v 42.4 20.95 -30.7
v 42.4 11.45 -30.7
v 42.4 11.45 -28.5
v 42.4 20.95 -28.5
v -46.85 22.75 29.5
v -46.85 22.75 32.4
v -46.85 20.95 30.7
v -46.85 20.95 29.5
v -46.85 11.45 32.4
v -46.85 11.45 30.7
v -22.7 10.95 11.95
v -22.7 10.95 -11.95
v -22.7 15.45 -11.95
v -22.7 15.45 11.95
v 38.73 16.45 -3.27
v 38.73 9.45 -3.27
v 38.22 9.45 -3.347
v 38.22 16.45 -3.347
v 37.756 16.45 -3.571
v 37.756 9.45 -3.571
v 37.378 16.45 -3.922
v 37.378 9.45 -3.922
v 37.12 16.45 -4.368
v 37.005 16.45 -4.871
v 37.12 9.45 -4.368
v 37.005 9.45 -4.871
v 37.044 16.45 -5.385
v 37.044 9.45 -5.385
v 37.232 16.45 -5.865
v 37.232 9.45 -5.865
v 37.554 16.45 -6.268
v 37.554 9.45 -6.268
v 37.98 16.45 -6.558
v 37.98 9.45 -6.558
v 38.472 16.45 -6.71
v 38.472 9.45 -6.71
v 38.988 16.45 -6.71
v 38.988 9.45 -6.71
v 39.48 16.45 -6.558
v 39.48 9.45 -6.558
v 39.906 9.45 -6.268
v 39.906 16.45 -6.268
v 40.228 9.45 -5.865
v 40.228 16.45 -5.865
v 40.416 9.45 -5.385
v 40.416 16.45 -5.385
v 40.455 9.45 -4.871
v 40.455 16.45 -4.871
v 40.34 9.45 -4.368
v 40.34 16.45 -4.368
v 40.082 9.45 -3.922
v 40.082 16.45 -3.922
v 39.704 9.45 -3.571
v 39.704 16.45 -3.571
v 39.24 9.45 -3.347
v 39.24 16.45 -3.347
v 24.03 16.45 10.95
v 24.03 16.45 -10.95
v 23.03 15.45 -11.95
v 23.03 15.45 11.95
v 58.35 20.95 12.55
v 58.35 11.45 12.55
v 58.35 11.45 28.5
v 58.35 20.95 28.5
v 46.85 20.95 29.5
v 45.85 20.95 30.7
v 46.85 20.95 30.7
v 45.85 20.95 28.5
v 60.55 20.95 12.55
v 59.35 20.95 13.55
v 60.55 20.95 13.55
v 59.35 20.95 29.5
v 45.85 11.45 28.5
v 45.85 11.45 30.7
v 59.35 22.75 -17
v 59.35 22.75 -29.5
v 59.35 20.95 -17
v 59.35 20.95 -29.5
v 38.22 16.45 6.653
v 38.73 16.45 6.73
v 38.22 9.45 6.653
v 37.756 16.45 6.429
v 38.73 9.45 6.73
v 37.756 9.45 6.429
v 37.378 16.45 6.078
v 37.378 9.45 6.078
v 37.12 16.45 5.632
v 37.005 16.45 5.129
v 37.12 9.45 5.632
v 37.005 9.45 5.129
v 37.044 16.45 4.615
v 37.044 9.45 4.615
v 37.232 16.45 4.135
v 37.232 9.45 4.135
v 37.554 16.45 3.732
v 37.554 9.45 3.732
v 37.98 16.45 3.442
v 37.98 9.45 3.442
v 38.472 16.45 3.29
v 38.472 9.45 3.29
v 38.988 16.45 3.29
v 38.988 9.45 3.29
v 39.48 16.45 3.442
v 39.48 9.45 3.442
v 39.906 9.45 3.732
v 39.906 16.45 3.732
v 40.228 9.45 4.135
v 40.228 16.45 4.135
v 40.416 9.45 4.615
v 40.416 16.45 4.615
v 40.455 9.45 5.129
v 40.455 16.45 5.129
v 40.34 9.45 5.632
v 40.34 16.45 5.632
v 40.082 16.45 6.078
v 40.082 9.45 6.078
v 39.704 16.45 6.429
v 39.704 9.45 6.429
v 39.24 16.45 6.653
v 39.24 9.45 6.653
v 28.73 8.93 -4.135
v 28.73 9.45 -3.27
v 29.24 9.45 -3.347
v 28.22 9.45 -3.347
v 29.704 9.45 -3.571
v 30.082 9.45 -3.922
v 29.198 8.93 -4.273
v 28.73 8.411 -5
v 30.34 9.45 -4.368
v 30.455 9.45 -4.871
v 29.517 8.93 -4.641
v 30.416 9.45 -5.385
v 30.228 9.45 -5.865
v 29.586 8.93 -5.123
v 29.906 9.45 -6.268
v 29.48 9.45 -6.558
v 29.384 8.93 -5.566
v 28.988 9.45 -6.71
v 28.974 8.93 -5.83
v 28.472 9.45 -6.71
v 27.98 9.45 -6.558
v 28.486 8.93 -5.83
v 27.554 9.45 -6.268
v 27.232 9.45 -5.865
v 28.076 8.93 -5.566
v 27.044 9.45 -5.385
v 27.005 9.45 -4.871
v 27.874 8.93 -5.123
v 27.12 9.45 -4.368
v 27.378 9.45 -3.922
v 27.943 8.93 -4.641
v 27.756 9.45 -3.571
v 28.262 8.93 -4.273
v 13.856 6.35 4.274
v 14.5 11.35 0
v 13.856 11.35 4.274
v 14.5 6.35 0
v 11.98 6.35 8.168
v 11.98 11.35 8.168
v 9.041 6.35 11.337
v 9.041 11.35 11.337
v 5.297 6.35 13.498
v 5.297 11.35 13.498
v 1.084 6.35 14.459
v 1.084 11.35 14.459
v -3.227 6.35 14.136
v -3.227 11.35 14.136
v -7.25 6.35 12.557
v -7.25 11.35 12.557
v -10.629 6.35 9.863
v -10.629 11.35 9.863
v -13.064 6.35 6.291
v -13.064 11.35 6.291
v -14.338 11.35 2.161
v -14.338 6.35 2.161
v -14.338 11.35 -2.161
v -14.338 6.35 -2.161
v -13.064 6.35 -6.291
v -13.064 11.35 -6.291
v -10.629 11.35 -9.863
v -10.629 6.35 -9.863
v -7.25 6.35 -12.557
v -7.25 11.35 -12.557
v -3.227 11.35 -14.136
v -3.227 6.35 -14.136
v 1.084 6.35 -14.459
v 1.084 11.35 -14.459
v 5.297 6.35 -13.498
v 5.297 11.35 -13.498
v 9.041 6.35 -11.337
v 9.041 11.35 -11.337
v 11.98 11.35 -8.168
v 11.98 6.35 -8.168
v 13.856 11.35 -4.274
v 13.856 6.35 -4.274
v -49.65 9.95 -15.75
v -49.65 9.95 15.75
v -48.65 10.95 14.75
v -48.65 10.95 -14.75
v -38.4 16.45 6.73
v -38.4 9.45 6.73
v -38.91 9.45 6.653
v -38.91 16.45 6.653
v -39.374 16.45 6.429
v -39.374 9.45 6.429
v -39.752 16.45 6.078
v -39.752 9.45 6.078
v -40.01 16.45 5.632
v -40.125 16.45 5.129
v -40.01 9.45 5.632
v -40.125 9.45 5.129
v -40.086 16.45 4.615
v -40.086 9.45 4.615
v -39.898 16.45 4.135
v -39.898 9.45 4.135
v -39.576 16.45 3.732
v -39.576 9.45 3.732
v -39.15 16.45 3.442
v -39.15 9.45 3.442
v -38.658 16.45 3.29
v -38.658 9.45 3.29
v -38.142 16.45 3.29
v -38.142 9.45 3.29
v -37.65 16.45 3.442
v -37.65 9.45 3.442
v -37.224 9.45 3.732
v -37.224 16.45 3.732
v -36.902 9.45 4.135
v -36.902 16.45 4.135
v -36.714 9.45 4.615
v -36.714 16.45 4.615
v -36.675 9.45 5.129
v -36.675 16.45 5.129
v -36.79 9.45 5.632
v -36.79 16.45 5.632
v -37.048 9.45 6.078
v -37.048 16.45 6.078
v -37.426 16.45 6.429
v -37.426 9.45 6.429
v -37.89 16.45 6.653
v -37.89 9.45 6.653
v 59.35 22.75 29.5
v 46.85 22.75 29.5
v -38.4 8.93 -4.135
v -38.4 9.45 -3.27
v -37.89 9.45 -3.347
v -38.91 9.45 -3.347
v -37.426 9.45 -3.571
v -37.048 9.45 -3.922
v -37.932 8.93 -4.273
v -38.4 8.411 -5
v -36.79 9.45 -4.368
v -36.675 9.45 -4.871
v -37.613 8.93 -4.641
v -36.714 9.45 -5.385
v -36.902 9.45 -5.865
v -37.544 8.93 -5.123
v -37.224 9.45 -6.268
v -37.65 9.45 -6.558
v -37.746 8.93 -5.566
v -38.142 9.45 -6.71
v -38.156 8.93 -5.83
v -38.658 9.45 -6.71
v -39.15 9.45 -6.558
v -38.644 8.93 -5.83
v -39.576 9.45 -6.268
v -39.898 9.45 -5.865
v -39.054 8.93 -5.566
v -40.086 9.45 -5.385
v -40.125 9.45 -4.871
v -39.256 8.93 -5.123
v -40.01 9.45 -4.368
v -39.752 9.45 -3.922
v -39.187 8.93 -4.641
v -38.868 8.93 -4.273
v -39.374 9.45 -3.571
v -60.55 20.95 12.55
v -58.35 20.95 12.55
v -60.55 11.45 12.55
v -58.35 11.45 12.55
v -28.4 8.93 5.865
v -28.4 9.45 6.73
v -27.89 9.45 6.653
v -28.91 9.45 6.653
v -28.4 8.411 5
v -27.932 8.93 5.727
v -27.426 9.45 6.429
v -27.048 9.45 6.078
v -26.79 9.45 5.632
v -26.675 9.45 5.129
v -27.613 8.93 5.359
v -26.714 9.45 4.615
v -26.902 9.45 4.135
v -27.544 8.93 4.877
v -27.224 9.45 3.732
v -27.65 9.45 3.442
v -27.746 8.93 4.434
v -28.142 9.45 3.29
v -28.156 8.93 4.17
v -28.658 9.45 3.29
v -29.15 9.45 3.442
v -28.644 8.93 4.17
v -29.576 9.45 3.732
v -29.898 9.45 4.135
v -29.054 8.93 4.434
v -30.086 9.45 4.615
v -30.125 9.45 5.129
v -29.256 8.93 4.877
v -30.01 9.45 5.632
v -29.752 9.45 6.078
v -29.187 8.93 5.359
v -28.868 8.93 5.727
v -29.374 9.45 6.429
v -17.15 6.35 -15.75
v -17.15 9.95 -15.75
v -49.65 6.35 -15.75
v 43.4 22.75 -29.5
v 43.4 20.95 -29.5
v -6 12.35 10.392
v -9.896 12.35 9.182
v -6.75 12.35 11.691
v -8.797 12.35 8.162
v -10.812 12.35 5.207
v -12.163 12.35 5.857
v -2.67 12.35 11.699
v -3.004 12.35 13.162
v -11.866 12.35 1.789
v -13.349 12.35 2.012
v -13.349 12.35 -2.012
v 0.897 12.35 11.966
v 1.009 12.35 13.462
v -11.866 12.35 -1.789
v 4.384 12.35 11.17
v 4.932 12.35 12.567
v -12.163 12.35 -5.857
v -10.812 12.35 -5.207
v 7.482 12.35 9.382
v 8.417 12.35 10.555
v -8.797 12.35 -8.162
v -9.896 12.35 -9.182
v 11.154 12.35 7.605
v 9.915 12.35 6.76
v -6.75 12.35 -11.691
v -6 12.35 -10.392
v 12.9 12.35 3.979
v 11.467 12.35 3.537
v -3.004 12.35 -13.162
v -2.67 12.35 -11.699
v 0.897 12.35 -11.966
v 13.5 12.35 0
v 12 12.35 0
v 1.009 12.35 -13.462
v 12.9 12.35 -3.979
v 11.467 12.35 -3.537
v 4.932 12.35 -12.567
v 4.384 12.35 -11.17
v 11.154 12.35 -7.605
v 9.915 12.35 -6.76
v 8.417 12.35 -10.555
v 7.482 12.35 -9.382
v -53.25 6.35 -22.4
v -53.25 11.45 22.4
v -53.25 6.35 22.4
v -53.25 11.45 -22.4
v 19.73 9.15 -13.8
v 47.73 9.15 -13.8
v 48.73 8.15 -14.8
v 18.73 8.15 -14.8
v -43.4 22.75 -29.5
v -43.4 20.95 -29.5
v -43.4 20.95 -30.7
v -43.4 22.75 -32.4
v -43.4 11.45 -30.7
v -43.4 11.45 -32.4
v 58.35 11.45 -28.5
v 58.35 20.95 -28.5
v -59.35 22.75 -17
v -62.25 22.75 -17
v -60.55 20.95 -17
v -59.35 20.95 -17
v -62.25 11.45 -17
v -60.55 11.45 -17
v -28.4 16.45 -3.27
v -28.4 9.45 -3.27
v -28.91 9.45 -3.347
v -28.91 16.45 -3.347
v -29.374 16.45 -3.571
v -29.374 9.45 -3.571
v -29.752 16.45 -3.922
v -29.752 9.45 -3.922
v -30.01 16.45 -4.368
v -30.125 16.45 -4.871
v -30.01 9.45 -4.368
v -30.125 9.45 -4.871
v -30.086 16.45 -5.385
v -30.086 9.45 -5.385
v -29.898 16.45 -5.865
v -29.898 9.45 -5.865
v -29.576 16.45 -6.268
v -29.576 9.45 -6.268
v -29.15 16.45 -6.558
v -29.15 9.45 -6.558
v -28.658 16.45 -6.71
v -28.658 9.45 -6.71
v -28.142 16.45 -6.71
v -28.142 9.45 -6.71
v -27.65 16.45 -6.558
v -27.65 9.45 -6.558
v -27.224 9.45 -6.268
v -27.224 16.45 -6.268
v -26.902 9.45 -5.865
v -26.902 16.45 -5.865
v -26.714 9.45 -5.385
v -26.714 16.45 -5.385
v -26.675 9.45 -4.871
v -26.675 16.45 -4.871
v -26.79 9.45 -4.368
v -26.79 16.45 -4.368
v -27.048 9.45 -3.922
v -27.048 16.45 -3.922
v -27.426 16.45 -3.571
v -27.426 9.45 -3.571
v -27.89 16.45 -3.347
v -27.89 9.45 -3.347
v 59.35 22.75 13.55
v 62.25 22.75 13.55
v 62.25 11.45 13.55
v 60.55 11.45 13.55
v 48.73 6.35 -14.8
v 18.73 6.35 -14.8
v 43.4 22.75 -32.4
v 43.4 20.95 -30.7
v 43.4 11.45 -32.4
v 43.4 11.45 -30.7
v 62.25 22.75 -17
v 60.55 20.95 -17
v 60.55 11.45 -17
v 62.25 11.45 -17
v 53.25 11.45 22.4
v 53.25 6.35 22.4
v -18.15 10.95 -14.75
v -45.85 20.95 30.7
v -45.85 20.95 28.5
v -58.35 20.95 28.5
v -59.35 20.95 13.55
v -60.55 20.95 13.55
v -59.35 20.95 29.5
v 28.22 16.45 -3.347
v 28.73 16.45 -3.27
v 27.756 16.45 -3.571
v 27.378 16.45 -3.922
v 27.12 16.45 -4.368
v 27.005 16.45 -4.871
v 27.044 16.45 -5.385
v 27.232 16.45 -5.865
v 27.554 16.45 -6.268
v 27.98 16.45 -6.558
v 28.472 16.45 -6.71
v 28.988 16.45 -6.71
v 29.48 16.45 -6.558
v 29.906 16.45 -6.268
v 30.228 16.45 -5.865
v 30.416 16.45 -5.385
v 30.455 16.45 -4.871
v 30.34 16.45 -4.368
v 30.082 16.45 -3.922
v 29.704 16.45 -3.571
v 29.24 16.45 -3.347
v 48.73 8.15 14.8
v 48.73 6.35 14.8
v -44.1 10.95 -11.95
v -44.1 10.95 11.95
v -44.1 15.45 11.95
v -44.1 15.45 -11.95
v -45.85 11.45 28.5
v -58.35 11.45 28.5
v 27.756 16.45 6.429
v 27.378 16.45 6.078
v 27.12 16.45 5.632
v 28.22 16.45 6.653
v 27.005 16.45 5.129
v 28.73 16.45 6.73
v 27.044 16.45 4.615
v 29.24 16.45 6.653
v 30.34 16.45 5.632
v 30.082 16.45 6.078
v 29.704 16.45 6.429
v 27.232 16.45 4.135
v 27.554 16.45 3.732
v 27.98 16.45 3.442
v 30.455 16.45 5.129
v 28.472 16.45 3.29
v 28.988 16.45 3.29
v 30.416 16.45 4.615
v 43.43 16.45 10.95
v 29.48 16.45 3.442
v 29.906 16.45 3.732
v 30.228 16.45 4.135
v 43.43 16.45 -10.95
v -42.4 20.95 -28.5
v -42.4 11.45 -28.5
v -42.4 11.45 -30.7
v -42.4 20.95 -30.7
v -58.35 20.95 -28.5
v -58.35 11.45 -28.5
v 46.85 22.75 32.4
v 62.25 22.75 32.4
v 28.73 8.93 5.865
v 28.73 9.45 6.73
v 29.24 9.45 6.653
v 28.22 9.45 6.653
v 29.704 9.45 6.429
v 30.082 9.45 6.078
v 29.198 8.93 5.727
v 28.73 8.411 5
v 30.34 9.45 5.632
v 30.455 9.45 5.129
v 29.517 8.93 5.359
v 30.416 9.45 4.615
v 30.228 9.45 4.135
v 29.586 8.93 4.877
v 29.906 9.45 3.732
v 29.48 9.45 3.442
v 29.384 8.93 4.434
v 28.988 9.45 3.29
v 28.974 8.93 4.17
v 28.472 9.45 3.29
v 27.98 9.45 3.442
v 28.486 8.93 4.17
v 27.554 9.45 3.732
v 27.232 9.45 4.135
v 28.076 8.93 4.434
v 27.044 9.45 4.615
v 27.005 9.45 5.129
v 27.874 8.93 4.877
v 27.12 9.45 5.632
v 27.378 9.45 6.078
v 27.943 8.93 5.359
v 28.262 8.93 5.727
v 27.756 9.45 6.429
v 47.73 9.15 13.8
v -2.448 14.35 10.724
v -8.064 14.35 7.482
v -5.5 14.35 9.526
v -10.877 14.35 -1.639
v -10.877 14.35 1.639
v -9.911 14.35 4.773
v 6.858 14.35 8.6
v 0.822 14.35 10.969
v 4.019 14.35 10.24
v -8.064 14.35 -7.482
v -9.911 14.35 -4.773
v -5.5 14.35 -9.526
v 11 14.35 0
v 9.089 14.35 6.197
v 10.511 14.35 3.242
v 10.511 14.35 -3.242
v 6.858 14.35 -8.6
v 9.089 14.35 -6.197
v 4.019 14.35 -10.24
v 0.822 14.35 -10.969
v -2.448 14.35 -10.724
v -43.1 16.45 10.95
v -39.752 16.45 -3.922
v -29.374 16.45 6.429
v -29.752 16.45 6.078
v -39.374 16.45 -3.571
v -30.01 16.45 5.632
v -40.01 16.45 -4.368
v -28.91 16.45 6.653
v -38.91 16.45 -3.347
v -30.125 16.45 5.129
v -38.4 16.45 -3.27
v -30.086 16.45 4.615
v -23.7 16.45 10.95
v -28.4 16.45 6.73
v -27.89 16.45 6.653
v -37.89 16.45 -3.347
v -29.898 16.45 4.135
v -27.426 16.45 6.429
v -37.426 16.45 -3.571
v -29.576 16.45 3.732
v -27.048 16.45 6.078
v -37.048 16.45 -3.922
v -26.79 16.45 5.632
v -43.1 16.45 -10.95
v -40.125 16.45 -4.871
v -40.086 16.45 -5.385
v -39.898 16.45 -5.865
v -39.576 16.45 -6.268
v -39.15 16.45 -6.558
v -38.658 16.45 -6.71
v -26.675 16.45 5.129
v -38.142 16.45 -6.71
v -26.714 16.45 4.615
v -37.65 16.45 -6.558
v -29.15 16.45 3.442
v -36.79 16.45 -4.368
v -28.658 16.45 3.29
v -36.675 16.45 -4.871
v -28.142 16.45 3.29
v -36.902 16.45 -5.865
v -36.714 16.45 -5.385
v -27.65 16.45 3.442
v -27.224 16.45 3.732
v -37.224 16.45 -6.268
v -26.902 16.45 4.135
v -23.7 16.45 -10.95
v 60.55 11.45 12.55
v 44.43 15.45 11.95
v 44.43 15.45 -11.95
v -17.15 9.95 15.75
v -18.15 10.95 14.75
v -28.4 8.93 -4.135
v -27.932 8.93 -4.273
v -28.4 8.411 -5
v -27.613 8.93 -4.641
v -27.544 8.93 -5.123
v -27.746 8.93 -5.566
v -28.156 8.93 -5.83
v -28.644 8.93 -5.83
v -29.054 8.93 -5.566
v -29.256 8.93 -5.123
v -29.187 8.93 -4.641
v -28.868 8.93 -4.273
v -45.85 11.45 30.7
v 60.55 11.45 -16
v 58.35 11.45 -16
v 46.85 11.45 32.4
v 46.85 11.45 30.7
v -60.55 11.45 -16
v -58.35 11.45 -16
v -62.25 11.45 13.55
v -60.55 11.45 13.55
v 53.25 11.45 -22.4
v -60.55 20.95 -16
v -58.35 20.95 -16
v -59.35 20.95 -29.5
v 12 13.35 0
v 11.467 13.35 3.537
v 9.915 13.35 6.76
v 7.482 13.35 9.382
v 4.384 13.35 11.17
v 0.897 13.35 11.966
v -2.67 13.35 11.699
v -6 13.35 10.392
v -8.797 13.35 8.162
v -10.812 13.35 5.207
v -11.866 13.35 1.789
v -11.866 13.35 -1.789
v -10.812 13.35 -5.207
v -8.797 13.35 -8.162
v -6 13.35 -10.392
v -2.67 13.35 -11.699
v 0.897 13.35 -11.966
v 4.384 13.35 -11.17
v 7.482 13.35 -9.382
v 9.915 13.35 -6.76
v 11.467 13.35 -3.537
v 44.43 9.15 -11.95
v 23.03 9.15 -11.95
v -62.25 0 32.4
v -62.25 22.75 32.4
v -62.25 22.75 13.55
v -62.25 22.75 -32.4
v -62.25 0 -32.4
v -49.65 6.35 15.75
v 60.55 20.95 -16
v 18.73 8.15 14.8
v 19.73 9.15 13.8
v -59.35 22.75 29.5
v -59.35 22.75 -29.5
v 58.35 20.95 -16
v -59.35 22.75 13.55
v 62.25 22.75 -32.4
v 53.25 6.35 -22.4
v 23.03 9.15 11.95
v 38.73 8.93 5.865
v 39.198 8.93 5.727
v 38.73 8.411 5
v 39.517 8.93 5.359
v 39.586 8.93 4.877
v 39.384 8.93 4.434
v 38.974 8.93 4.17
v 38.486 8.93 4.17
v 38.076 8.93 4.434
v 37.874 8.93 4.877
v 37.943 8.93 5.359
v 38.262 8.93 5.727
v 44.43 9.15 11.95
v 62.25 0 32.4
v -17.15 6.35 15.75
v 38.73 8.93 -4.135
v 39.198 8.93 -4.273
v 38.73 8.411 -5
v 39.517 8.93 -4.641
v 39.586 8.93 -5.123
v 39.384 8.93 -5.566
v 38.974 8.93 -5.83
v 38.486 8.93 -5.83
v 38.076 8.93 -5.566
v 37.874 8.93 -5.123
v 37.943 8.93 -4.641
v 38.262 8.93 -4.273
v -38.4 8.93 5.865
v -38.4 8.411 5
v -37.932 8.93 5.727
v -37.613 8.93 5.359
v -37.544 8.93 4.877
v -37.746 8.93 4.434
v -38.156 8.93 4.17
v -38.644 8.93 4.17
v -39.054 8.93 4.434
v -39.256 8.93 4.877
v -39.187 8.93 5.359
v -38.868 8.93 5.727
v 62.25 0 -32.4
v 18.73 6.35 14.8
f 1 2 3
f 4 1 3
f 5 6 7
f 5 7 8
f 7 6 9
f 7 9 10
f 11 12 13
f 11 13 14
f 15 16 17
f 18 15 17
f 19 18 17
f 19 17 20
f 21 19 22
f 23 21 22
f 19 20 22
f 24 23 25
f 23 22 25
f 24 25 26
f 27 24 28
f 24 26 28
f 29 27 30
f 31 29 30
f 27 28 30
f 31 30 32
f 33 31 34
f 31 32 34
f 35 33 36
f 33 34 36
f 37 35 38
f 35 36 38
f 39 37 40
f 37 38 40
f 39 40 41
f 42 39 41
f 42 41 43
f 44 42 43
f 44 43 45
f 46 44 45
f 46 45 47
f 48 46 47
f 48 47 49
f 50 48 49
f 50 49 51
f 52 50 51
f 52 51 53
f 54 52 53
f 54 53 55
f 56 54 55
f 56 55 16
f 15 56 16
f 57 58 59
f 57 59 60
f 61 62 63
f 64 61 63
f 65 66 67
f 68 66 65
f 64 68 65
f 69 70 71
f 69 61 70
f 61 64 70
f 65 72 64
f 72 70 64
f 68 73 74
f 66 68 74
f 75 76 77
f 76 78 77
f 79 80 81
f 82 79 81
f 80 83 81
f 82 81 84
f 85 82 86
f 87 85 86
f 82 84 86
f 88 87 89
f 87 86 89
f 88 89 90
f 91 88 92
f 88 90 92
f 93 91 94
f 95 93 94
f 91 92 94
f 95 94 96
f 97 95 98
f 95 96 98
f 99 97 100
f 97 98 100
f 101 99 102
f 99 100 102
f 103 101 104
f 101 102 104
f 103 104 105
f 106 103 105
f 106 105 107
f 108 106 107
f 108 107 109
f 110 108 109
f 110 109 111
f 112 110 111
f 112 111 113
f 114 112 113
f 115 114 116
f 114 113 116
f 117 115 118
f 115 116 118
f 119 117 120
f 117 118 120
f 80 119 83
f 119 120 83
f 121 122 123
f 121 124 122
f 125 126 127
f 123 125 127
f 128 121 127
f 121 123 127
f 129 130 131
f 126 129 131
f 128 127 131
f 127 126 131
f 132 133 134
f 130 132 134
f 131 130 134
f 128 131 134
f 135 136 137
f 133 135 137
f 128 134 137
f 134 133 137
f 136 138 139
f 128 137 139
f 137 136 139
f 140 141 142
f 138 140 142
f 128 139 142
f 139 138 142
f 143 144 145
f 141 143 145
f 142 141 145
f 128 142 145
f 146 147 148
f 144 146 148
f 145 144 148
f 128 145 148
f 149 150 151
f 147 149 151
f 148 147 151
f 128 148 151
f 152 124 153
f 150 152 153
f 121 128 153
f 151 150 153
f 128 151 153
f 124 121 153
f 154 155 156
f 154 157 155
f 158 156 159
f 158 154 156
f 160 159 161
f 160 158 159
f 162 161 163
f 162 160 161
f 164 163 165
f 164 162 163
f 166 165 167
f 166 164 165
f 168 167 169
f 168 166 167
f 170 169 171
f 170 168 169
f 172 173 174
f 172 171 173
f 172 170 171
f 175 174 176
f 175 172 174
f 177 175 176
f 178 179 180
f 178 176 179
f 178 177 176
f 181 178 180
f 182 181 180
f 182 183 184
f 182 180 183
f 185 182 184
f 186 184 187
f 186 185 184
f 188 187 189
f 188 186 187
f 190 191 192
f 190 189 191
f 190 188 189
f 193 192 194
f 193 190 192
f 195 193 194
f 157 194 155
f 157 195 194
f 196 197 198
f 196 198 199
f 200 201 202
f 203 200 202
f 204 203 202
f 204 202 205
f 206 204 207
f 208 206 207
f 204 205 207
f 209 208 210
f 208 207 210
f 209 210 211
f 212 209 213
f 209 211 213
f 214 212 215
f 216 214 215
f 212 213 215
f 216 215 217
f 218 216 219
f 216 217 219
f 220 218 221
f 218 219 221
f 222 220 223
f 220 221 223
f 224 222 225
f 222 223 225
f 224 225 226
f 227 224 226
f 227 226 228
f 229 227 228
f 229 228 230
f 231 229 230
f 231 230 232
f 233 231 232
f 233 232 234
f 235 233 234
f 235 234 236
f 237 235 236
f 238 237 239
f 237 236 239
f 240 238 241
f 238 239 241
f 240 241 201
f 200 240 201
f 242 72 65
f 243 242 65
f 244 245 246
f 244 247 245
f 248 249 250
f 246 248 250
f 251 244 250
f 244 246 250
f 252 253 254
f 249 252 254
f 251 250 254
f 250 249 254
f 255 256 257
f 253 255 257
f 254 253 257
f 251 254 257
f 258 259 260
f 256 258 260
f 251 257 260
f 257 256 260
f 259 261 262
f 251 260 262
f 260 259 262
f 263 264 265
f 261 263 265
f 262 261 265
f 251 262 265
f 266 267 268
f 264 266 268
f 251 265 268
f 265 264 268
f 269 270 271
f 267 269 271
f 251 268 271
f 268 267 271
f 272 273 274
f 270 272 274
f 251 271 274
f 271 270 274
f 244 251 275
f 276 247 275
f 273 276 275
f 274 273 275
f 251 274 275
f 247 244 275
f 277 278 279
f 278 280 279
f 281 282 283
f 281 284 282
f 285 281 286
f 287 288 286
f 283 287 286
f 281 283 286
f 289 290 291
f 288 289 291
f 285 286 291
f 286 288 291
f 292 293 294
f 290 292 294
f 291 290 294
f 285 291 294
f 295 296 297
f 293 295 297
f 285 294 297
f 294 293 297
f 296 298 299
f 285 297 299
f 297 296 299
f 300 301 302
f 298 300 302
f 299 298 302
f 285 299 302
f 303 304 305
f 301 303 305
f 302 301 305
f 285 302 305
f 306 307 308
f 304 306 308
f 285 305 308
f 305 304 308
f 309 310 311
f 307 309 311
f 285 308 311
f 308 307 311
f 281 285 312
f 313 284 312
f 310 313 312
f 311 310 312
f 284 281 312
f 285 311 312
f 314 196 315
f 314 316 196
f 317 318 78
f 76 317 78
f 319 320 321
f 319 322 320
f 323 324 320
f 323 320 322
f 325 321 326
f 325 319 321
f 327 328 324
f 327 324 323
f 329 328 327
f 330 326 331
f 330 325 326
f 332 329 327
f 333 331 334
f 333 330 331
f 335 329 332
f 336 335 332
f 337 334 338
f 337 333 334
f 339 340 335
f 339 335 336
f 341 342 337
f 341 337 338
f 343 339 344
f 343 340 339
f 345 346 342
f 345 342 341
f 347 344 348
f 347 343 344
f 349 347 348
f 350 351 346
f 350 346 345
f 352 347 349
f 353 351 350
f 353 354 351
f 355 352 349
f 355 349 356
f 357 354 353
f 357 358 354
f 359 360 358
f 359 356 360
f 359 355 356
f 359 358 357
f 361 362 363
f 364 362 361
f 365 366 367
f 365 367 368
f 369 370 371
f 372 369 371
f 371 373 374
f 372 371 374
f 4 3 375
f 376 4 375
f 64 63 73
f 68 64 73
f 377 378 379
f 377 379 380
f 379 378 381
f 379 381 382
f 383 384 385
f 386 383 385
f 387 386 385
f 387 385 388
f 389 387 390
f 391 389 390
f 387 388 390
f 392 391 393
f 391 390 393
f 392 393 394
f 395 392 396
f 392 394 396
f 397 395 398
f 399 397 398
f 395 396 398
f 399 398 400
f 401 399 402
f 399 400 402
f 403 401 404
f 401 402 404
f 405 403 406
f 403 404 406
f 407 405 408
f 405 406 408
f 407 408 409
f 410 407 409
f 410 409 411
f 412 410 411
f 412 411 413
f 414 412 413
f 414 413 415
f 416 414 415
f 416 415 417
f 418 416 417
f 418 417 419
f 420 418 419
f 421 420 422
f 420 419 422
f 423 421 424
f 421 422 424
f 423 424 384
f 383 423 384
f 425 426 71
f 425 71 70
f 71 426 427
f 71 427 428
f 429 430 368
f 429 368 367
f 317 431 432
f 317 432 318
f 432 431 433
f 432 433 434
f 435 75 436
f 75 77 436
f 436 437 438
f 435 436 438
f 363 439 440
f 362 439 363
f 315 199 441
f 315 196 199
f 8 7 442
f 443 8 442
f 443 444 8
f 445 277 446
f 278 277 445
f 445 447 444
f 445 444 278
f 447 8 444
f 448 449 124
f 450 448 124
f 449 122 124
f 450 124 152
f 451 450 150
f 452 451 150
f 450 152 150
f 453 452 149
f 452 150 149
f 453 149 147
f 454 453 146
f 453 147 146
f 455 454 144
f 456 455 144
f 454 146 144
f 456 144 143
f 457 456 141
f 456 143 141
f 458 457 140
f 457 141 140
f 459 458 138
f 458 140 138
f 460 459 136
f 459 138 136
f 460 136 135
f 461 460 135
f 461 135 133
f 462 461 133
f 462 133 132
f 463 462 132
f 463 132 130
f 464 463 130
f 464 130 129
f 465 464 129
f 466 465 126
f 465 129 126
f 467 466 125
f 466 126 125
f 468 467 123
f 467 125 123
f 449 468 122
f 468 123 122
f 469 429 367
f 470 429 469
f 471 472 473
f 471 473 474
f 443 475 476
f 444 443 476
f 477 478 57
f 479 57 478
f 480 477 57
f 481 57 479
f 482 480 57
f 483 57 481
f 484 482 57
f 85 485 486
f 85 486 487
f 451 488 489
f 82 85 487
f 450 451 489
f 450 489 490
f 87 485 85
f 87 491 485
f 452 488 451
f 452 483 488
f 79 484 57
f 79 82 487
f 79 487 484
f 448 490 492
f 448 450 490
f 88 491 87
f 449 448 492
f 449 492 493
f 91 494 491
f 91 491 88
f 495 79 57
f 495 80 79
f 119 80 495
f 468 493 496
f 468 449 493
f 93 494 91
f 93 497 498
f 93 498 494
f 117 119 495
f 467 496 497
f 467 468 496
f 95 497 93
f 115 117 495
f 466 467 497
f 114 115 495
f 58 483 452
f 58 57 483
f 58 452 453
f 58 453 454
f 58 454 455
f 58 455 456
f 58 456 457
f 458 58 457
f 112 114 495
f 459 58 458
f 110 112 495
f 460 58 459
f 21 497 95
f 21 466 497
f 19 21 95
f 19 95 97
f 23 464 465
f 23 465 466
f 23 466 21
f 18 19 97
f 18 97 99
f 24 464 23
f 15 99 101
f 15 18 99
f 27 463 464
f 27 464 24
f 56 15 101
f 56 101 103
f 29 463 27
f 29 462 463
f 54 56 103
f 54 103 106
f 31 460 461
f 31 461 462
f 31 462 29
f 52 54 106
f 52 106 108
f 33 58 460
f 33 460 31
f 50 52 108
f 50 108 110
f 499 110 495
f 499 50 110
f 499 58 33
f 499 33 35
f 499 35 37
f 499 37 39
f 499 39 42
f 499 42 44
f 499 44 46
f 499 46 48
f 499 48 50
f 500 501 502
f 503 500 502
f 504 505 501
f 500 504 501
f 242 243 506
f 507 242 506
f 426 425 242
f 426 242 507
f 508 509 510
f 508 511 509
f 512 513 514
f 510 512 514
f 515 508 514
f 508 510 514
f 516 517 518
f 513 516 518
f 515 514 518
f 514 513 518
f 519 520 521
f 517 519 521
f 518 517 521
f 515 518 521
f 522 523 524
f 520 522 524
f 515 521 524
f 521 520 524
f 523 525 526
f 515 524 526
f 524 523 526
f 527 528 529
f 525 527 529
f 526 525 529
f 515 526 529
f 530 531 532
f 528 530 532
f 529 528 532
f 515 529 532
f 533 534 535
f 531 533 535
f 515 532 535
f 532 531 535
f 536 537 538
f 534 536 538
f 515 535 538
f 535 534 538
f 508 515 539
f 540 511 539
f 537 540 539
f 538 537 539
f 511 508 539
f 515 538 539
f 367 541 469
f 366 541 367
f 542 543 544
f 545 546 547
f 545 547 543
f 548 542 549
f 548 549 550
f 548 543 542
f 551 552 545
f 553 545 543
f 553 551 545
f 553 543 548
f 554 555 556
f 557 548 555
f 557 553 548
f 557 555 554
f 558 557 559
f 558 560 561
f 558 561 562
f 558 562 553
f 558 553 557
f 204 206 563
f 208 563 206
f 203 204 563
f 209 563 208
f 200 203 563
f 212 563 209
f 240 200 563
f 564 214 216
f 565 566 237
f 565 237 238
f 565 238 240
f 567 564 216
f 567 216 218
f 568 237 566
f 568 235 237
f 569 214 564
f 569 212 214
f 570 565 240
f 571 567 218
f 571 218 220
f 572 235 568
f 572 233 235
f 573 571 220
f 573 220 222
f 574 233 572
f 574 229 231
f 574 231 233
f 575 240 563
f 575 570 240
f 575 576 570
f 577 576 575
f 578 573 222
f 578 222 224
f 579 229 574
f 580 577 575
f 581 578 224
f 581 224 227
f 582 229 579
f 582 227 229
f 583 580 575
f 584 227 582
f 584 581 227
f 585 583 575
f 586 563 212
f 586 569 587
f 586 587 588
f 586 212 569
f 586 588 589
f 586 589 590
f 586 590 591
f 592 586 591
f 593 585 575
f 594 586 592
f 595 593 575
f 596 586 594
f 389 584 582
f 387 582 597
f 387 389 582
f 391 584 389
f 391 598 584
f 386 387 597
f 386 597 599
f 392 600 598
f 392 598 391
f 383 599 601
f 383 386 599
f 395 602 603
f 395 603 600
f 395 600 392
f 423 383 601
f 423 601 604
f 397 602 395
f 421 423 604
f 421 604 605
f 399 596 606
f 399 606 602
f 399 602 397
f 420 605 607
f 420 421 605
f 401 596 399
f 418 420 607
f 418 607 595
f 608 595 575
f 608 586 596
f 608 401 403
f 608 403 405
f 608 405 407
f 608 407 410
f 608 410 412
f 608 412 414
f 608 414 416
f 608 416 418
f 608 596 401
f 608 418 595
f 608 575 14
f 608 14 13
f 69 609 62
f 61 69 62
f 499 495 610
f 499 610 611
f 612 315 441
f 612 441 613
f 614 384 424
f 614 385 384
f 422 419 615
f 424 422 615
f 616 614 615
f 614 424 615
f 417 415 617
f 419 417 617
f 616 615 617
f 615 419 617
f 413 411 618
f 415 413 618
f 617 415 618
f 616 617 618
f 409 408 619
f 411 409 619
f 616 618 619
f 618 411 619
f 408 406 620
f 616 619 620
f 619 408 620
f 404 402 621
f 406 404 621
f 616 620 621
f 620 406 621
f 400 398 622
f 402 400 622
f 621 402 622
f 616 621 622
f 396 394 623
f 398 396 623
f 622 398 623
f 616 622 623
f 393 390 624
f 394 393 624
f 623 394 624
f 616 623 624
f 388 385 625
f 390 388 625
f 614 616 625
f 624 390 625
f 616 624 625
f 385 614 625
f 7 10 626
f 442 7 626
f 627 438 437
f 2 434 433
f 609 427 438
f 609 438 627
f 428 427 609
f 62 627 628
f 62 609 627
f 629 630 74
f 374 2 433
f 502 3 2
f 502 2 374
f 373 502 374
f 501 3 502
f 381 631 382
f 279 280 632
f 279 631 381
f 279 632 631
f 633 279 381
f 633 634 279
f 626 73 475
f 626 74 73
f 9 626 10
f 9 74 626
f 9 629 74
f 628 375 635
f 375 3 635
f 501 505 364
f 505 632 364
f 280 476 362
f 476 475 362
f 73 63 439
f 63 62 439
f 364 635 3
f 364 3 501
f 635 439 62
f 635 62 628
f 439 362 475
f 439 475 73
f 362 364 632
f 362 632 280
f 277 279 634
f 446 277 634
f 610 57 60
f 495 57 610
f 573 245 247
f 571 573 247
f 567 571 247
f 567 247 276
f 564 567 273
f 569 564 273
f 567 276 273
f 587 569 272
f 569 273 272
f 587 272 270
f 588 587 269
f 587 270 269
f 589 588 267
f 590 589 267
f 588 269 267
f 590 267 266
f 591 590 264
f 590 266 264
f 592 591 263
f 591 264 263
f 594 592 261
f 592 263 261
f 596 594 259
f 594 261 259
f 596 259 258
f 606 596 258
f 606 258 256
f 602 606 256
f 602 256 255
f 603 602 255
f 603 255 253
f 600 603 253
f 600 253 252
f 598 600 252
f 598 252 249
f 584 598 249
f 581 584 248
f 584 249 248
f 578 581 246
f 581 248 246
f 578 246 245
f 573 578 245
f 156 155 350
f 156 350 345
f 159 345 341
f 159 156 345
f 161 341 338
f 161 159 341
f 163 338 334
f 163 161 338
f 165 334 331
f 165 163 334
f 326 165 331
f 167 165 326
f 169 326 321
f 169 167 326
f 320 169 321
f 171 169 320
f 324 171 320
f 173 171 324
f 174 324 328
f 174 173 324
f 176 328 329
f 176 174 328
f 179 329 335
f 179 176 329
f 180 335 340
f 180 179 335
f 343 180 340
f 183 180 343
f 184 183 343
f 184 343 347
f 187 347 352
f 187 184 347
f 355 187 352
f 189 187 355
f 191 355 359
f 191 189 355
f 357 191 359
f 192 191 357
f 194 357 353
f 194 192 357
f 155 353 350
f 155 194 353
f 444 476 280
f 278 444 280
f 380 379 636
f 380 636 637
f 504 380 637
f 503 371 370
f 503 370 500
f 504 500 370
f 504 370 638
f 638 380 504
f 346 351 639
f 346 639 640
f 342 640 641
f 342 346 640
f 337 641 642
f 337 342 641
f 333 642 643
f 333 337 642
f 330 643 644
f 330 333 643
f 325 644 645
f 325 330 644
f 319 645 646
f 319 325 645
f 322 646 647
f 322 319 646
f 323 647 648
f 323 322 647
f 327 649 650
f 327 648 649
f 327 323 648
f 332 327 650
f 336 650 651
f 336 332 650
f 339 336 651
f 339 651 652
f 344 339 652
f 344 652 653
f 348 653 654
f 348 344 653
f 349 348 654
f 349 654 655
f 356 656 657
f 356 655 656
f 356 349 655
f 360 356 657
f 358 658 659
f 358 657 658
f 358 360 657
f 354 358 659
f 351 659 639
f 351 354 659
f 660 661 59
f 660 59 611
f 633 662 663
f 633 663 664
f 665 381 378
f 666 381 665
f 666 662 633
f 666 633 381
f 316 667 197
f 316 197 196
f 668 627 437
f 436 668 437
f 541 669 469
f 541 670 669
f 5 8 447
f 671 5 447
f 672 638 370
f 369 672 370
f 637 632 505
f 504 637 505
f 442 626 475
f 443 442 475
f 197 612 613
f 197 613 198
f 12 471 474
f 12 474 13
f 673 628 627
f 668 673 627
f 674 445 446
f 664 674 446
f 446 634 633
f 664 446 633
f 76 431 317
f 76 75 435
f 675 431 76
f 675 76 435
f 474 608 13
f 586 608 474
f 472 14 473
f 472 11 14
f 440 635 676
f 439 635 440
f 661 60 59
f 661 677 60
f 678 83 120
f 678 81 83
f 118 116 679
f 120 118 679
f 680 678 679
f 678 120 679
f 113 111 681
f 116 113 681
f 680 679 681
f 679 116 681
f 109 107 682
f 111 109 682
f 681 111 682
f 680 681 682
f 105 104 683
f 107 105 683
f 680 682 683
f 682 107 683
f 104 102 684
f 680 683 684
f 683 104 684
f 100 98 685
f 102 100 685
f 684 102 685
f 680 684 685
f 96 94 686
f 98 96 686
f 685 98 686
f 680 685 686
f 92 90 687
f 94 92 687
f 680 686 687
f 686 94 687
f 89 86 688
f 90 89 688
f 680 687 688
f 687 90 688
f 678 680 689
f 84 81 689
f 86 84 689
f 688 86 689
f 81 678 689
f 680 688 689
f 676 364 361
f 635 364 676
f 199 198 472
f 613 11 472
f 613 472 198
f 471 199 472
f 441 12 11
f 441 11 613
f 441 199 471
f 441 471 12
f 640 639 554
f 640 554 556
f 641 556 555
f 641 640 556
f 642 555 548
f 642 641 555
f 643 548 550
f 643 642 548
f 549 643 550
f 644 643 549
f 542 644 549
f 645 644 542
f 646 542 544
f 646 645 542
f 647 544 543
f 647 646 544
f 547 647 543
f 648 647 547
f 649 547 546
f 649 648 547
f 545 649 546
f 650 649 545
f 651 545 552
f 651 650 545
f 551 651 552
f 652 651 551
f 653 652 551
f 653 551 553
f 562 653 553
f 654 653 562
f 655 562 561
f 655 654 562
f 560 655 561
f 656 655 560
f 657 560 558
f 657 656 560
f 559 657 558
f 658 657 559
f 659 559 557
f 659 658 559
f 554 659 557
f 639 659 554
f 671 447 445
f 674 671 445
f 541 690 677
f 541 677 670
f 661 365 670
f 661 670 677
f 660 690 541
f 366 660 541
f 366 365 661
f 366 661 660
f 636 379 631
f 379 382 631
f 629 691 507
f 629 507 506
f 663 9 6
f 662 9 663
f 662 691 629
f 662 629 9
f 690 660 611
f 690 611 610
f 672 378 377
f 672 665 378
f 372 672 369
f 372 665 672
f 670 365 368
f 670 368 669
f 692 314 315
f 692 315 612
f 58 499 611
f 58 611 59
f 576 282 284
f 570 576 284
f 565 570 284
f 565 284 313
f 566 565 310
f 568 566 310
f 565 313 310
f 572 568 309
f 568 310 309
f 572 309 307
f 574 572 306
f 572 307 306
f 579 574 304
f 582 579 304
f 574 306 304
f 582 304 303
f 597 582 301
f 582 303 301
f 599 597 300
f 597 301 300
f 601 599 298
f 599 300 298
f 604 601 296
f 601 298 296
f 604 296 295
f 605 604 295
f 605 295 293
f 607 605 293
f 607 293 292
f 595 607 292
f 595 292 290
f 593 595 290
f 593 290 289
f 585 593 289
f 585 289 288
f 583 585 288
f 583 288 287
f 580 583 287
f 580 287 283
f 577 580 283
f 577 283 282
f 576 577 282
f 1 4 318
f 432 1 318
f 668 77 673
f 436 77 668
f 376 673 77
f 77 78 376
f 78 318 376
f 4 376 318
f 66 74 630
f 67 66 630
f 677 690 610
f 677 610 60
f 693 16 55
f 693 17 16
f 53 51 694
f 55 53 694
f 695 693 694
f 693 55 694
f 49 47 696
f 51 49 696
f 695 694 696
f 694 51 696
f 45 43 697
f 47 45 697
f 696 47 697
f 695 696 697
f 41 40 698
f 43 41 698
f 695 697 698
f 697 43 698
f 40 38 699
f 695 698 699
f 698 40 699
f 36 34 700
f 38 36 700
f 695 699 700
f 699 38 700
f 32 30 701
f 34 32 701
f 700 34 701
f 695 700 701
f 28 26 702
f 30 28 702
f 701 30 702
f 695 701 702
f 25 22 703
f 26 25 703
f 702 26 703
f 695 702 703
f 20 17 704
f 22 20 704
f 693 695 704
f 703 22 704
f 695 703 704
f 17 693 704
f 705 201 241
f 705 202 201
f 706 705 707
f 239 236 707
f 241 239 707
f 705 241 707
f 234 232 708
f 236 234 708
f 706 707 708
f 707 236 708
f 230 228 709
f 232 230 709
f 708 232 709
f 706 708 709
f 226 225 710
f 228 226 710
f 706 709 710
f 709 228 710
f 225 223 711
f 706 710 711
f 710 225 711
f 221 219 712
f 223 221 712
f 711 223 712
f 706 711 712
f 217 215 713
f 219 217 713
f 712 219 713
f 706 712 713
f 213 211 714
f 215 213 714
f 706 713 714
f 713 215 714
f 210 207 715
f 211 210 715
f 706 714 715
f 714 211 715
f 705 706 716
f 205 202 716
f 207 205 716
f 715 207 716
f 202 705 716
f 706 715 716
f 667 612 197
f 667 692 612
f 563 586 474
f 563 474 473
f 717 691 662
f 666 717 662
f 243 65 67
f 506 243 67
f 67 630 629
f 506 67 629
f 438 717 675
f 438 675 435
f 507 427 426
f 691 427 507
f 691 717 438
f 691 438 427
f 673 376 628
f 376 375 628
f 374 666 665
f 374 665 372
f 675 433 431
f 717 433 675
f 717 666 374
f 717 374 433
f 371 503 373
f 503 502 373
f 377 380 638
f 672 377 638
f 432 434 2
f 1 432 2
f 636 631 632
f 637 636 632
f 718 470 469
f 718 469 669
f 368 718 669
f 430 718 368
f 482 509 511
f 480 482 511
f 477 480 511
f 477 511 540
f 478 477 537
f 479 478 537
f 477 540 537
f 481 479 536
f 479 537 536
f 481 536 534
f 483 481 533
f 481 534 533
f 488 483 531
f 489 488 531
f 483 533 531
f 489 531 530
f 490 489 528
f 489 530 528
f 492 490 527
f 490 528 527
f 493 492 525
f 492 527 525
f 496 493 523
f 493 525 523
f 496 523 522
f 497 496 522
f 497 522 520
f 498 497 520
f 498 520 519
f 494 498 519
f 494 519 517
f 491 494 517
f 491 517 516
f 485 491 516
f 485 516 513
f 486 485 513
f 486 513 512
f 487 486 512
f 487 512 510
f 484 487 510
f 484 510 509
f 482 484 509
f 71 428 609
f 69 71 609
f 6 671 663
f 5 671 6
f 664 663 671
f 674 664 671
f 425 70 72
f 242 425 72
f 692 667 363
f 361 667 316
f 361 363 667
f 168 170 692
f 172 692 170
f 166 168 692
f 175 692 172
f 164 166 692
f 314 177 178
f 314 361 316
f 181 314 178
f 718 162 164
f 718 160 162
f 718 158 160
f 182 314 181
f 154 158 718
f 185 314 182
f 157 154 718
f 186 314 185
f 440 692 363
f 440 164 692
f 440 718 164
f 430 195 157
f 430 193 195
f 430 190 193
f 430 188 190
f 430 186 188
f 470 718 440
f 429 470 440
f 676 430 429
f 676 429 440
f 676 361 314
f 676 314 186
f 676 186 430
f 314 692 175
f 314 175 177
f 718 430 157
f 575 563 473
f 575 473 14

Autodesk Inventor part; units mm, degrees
ref_plane "YZ Plane" through (0, 0, 0) normal (1, 0, 0) x (0, 1, 0)
ref_plane "XZ Plane" through (0, 0, 0) normal (0, 1, 0) x (-1, 0, 0)
ref_plane "XY Plane" through (0, 0, 0) normal (0, 0, 1) x (1, 0, 0)
sketch "Sketch1" plane through (0, 0, 0) normal (0, 1, 0) x (-1, 0, 0)
  line L0 (62.25, -32.4) -> (-62.25, -32.4)
  line L1 (-62.25, -32.4) -> (-62.25, 32.4)
  line L2 (-62.25, 32.4) -> (62.25, 32.4)
  line L3 (62.25, 32.4) -> (62.25, -32.4)
  point P0 (0, 0)
  point P1 (62.25, 0)
  point P2 (0, -32.4)
  dimension "d0" = 64.8
  dimension "d2" = 124.5
extrude "Extrusion1" add sketch "Sketch1" along normal blind 11.45
sketch "Sketch2" plane through (0, 11.45, 0) normal (0, 1, 0) x (1, 0, 0)
  line L0 (62.25, 32.4) -> (-62.25, 32.4) projected
  line L1 (-62.25, 32.4) -> (-62.25, -32.4) projected
  line L2 (-62.25, -32.4) -> (62.25, -32.4) projected
  line L3 (62.25, -32.4) -> (62.25, 32.4) projected
  line L4 (-62.25, -13.55) -> (-62.25, -32.4)
  line L5 (-62.25, -32.4) -> (-46.85, -32.4)
  line L6 (-46.85, -32.4) -> (-46.85, -29.5)
  line L7 (-46.85, -29.5) -> (-59.35, -29.5)
  line L8 (-59.35, -29.5) -> (-59.35, -13.55)
  line L9 (-59.35, -13.55) -> (-62.25, -13.55)
  line L10 (62.25, -13.55) -> (59.35, -13.55)
  line L11 (59.35, -13.55) -> (59.35, -29.5)
  line L12 (59.35, -29.5) -> (46.85, -29.5)
  line L13 (46.85, -29.5) -> (46.85, -32.4)
  line L14 (62.25, -32.4) -> (62.25, -13.55)
  line L15 (46.85, -32.4) -> (62.25, -32.4)
  line L16 (43.4, 32.4) -> (43.4, 29.5)
  line L17 (43.4, 29.5) -> (59.35, 29.5)
  line L18 (62.25, 32.4) -> (43.4, 32.4)
  line L19 (59.35, 29.5) -> (59.35, 17)
  line L20 (59.35, 17) -> (62.25, 17)
  line L21 (62.25, 17) -> (62.25, 32.4)
  line L22 (-62.25, 17) -> (-59.35, 17)
  line L23 (-59.35, 17) -> (-59.35, 29.5)
  line L24 (-59.35, 29.5) -> (-43.4, 29.5)
  line L25 (-43.4, 29.5) -> (-43.4, 32.4)
  line L26 (-62.25, 32.4) -> (-62.25, 17)
  line L27 (-43.4, 32.4) -> (-62.25, 32.4)
  point P0 (0, 0)
  dimension "d5" = 18.85
  dimension "d7" = 15.4
  dimension "d8" = 2.9
  dimension "d9" = 2.9
  dimension "d10" = 18.85
  dimension "d11" = 2.9
  dimension "d12" = 2.9
  dimension "d13" = 15.4
  dimension "d21" = 15.4
  dimension "d22" = 18.85
  dimension "d23" = 2.9
  dimension "d24" = 2.9
  dimension "d28" = 15.4
  dimension "d29" = 2.9
  dimension "d30" = 2.9
  dimension "d31" = 18.85
extrude "Extrusion2" add sketch "Sketch2" along normal blind 11.3 contours L3 L20 L19 L17 L16 L0 | L25 L24 L23 L22 L1 L0 | L3 L2 L13 L12 L11 L10 | L9 L8 L7 L6 L2 L1
sketch "Sketch3" plane through (0, 11.45, 0) normal (0, 1, 0) x (1, 0, 0)
  line L0 (43.4, 32.4) -> (-43.4, 32.4) projected
  line L1 (-62.25, 17) -> (-62.25, -13.55) projected
  line L2 (-46.85, -32.4) -> (46.85, -32.4) projected
  line L3 (62.25, -13.55) -> (62.25, 17) projected
  line L4 (-53.25, 22.4) -> (53.25, 22.4)
  line L5 (53.25, 22.4) -> (53.25, -22.4)
  line L6 (53.25, -22.4) -> (-53.25, -22.4)
  line L7 (-53.25, -22.4) -> (-53.25, 22.4)
  point P0 (0, 0)
  dimension "d41" = 9
  dimension "d42" = 9
  dimension "d43" = 10
  dimension "d44" = 10
extrude "Extrusion3" cut sketch "Sketch3" against normal blind 5.1
sketch "Sketch4" plane through (0, 6.35, 0) normal (0, 1, 0) x (1, 0, 0)
  line L0 (-53.25, -22.4) -> (-53.25, 22.4) projected
  line L1 (-49.65, 15.75) -> (-17.15, 15.75)
  line L2 (-17.15, 15.75) -> (-17.15, -15.75)
  line L3 (-17.15, -15.75) -> (-49.65, -15.75)
  line L4 (-49.65, -15.75) -> (-49.65, 15.75)
  line L5 (43.4, 32.4) -> (-43.4, 32.4) projected
  point P0 (0, 0)
  dimension "d47" = 32.5
  dimension "d49" = 31.5
  dimension "d50" = 16.65
  dimension "d51" = 3.6
extrude "Extrusion4" add sketch "Sketch4" along normal blind 4.6
sketch "Sketch5" plane through (0, 10.95, 0) normal (0, 1, 0) x (1, 0, 0)
  line L0 (-17.15, 15.75) -> (-49.65, 15.75) projected
  line L1 (-49.65, 15.75) -> (-49.65, -15.75) projected
  line L2 (-44.1, 11.95) -> (-22.7, 11.95)
  line L3 (-22.7, 11.95) -> (-22.7, -11.95)
  line L4 (-22.7, -11.95) -> (-44.1, -11.95)
  line L5 (-44.1, -11.95) -> (-44.1, 11.95)
  point P0 (0, 0)
  point P1 (-33.4, 11.95)
  point P2 (-33.4, 15.75)
  point P3 (-44.1, 0)
  point P4 (-49.65, 0)
  dimension "d54" = 21.4
  dimension "d56" = 23.9
extrude "Extrusion5" add sketch "Sketch5" along normal blind 5.5
sketch "Sketch6" plane through (0, 6.35, 0) normal (0, 1, 0) x (1, 0, 0)
  line L0 (53.25, 22.4) -> (53.25, -22.4) projected
  line L1 (18.73, 14.8) -> (48.73, 14.8)
  line L2 (48.73, 14.8) -> (48.73, -14.8)
  line L3 (48.73, -14.8) -> (18.73, -14.8)
  line L4 (18.73, -14.8) -> (18.73, 14.8)
  point P0 (0, 0)
  point P1 (18.73, 0)
  dimension "d59" = 29.6
  dimension "d61" = 30
  dimension "d62" = 4.52
extrude "Extrusion6" add sketch "Sketch6" along normal blind 2.8
sketch "Sketch7" plane through (0, 9.15, 0) normal (0, 1, 0) x (1, 0, 0)
  line L0 (48.73, 14.8) -> (18.73, 14.8) projected
  line L1 (18.73, 14.8) -> (18.73, -14.8) projected
  line L2 (23.03, 11.95) -> (44.43, 11.95)
  line L3 (44.43, 11.95) -> (44.43, -11.95)
  line L4 (44.43, -11.95) -> (23.03, -11.95)
  line L5 (23.03, -11.95) -> (23.03, 11.95)
  point P0 (0, 0)
  point P1 (23.03, 0)
  point P2 (18.73, 0)
  point P3 (33.73, 11.95)
  point P4 (33.73, 14.8)
  dimension "d65" = 21.4
  dimension "d67" = 23.9
extrude "Extrusion7" add sketch "Sketch7" along normal blind 7.3
sketch "Sketch8" plane through (0, 11.45, 0) normal (0, 1, 0) x (1, 0, 0)
  line L0 (62.25, -13.55) -> (62.25, 17) projected
  line L1 (-60.55, -12.55) -> (-60.55, -13.55)
  line L2 (-60.55, -13.55) -> (-59.35, -13.55)
  line L3 (-59.35, -13.55) -> (-59.35, -29.5)
  line L4 (-59.35, -29.5) -> (-46.85, -29.5)
  line L5 (-46.85, -29.5) -> (-46.85, -30.7)
  line L6 (-46.85, -30.7) -> (-45.85, -30.7)
  line L7 (-45.85, -30.7) -> (-45.85, -28.5)
  line L8 (-45.85, -28.5) -> (-58.35, -28.5)
  line L9 (-58.35, -28.5) -> (-58.35, -12.55)
  line L10 (-58.35, -12.55) -> (-60.55, -12.55)
  line L11 (-59.35, -13.55) -> (-62.25, -13.55) projected
  line L12 (-59.35, -29.5) -> (-59.35, -13.55) projected
  line L13 (-46.85, -29.5) -> (-59.35, -29.5) projected
  line L14 (-46.85, -32.4) -> (-46.85, -29.5) projected
  line L15 (60.55, 16) -> (60.55, 17)
  line L16 (60.55, 17) -> (59.35, 17)
  line L17 (59.35, 17) -> (59.35, 29.5)
  line L18 (59.35, 29.5) -> (43.4, 29.5)
  line L19 (43.4, 29.5) -> (43.4, 30.7)
  line L20 (43.4, 30.7) -> (42.4, 30.7)
  line L21 (42.4, 30.7) -> (42.4, 28.5)
  line L22 (42.4, 28.5) -> (58.35, 28.5)
  line L23 (58.35, 28.5) -> (58.35, 16)
  line L24 (58.35, 16) -> (60.55, 16)
  line L25 (43.4, 29.5) -> (59.35, 29.5) projected
  line L26 (59.35, 29.5) -> (59.35, 17) projected
  line L27 (59.35, 17) -> (62.25, 17) projected
  line L28 (43.4, 32.4) -> (43.4, 29.5) projected
  line L29 (-60.55, 16) -> (-58.35, 16)
  line L30 (-58.35, 16) -> (-58.35, 28.5)
  line L31 (-58.35, 28.5) -> (-42.4, 28.5)
  line L32 (-42.4, 28.5) -> (-42.4, 30.7)
  line L33 (-42.4, 30.7) -> (-43.4, 30.7)
  line L34 (-43.4, 30.7) -> (-43.4, 29.5)
  line L35 (-43.4, 29.5) -> (-59.35, 29.5)
  line L36 (-59.35, 29.5) -> (-59.35, 17)
  line L37 (-59.35, 17) -> (-60.55, 17)
  line L38 (-60.55, 17) -> (-60.55, 16)
  line L39 (-59.35, 29.5) -> (-43.4, 29.5) projected
  line L40 (-59.35, 17) -> (-59.35, 29.5) projected
  line L41 (-43.4, 29.5) -> (-43.4, 32.4) projected
  line L42 (-62.25, 17) -> (-59.35, 17) projected
  line L43 (60.55, -12.55) -> (58.35, -12.55)
  line L44 (58.35, -12.55) -> (58.35, -28.5)
  line L45 (58.35, -28.5) -> (45.85, -28.5)
  line L46 (45.85, -28.5) -> (45.85, -30.7)
  line L47 (45.85, -30.7) -> (46.85, -30.7)
  line L48 (46.85, -30.7) -> (46.85, -29.5)
  line L49 (46.85, -29.5) -> (59.35, -29.5)
  line L50 (59.35, -29.5) -> (59.35, -13.55)
  line L51 (59.35, -13.55) -> (60.55, -13.55)
  line L52 (60.55, -13.55) -> (60.55, -12.55)
  line L53 (59.35, -13.55) -> (59.35, -29.5) projected
  line L54 (62.25, -13.55) -> (59.35, -13.55) projected
  line L55 (59.35, -29.5) -> (46.85, -29.5) projected
  line L56 (46.85, -29.5) -> (46.85, -32.4) projected
  point P0 (0, 0)
  dimension "d70" = 1
  dimension "d72" = 1
  dimension "d73" = 1
  dimension "d74" = 1
  dimension "d76" = 2.2
  dimension "d77" = 2.2
  dimension "d78" = 1
  dimension "d79" = 1
  dimension "d80" = 1
  dimension "d81" = 1
  dimension "d82" = 2.2
  dimension "d83" = 2.2
  dimension "d86" = 2.2
  dimension "d87" = 1
  dimension "d88" = 1
  dimension "d89" = 1
  dimension "d90" = 1
  dimension "d91" = 2.2
  dimension "d92" = 2.2
  dimension "d93" = 1
  dimension "d94" = 1
  dimension "d95" = 1
  dimension "d96" = 1
  dimension "d97" = 2.2
extrude "Extrusion8" add sketch "Sketch8" along normal blind 9.5
sketch "Sketch10" plane through (0, 6.35, 0) normal (0, 1, 0) x (1, 0, 0)
  circle A0 centre (0, 0) radius 14.5
  dimension "d133" = 29
extrude "Extrusion10" add sketch "Sketch10" along normal blind 6
sketch "Sketch11" plane through (0, 12.35, 0) normal (0, 1, 0) x (1, 0, 0)
  circle A0 centre (0, 0) radius 12
  dimension "d137" = 24
extrude "Extrusion11" add sketch "Sketch11" along normal blind 2
chamfer "Chamfer1" distance 1 angle 45 4 edges at (44.43, 16.45, 0) (33.73, 16.45, 11.95) (23.03, 16.45, 0) (33.73, 16.45, -11.95)
chamfer "Chamfer2" distance 1 angle 45 4 edges at (-33.4, 16.45, -11.95) (-44.1, 16.45, 0) (-33.4, 16.45, 11.95) (-22.7, 16.45, 0)
chamfer "Chamfer3" distance 1 angle 45 4 edges at (-33.4, 10.95, 15.75) (-49.65, 10.95, 0) (-33.4, 10.95, -15.75) (-17.15, 10.95, 0)
chamfer "Chamfer4" distance 1 angle 45 4 edges at (33.73, 9.15, -14.8) (18.73, 9.15, 0) (33.73, 9.15, 14.8) (48.73, 9.15, 0)
sketch "Sketch12" plane through (0, 16.45, 0) normal (0, 1, 0) x (1, 0, 0)
  line L0 (23.03, 11.95) -> (23.03, -11.95) projected
  point P0 (0, 0)
  point P1 (38.73, -5)
  point P2 (28.73, -5)
  point P3 (28.73, 5)
  point P4 (38.73, 5)
  point P5 (-38.1211, 5.7215)
  point P6 (-28.8217, 5.7215)
  point P7 (-28.8217, -4.174)
  point P8 (-38.1211, -5)
  dimension "d153" = 10
  dimension "d155" = 10
  dimension "d157" = 5
  dimension "d159" = 5.7
hole "Hole1" at (38.73, 16.45, 5) at (28.73, 16.45, 5) at (28.73, 16.45, -5) at (38.73, 16.45, -5) direction (0, -1, 0) diameter 3.459 depth 7 tip angle 118 thread size "M4x0.5" class "6H" standard "ISO Metric profile"
sketch "Sketch14" plane through (0, 16.45, 0) normal (0, 1, 0) x (1, 0, 0)
  line L0 (-44.1, 11.95) -> (-44.1, -11.95) projected
  point P0 (0, 0)
  point P1 (-38.4, 5)
  point P2 (-28.4, 5)
  point P3 (-28.4, -5)
  point P4 (-38.4, -5)
  dimension "d167" = 10
  dimension "d169" = 10
  dimension "d170" = 5
  dimension "d171" = 5.7
hole "Hole2" at (-38.4, 16.45, -5) at (-28.4, 16.45, -5) at (-28.4, 16.45, 5) at (-38.4, 16.45, 5) direction (0, -1, 0) diameter 3.459 depth 7 tip angle 118 thread size "M4x0.5" class "6H" standard "ISO Metric profile"
chamfer "Chamfer5" distance 1 angle 45 2 edges at (-12, 14.35, 0) (-14.5, 12.35, 0)
equation "\"d0\" = BtDp"
equation "\"d2\" = BtWd"
equation "\"d3\" = ModHt"
equation "\"d5\" = TopOutSh"
equation "\"d7\" = TopOutLn"
equation "\"d8\" = TopOutDp"
equation "\"d9\" = d8"
equation "\"d10\" = d5"
equation "\"d11\" = d9"
equation "\"d12\" = d9"
equation "\"d13\" = d7"
equation "\"d21\" = d25"
equation "\"d22\" = d26"
equation "\"d23\" = d27"
equation "\"d24\" = d23"
equation "\"d28\" = d32"
equation "\"d29\" = d33"
equation "\"d30\" = d33"
equation "\"d31\" = d34"
equation "\"d39\" = TopHoldHt"
equation "\"d41\" = LedgeSh"
equation "\"d42\" = d41"
equation "\"d43\" = LedgeLn"
equation "\"d44\" = d43"
equation "\"d45\" = InPdDp"
equation "\"d47\" = RedLeadPedesWd"
equation "\"d49\" = RedLeadPedesDp"
equation "\"d50\" = 0.5 * BtDp - 0.5 * RedLeadPedesDp"
equation "\"d51\" = RedLeadPedesGap"
equation "\"d52\" = RedLeadPedesHt"
equation "\"d54\" = RedLeadWd"
equation "\"d56\" = RedLeadDp"
equation "\"d57\" = RedLeadHt"
equation "\"d59\" = CyanLeadPedesWd"
equation "\"d61\" = CyanLeadPedesDp"
equation "\"d62\" = CyanLeadPedesGap"
equation "\"d63\" = CyanLeadPedesHt"
equation "\"d65\" = CyanLeadWd"
equation "\"d67\" = CyanLeadDp"
equation "\"d68\" = CyanLeadHt"
equation "\"d70\" = InCapHldWd"
equation "\"d72\" = d70"
equation "\"d73\" = d70"
equation "\"d74\" = d73"
equation "\"d76\" = InCapHldDp"
equation "\"d77\" = d76"
equation "\"d78\" = d84"
equation "\"d79\" = d78"
equation "\"d80\" = d78"
equation "\"d81\" = d80"
equation "\"d82\" = d85"
equation "\"d83\" = d82"
equation "\"d32\" = d35"
equation "\"d33\" = d36"
equation "\"d34\" = d37"
equation "\"d36\" = d38"
equation "\"BtDp\" = 64.8"
equation "\"BtWd\" = 124.5"
equation "\"ModHt\" = 11.45"
equation "\"TopOutSh\" = 18.85"
equation "\"TopOutLn\" = 15.4"
equation "\"TopOutDp\" = 2.9"
equation "\"d25\" = 15.4"
equation "\"d26\" = 18.85"
equation "\"d27\" = 2.9"
equation "\"TopHoldHt\" = 11.3"
equation "\"LedgeSh\" = 9"
equation "\"LedgeLn\" = 10"
equation "\"InPdDp\" = 5.1"
equation "\"RedLeadPedesWd\" = 32.5"
equation "\"RedLeadPedesDp\" = 31.5"
equation "\"RedLeadPedesGap\" = 3.6"
equation "\"RedLeadPedesHt\" = 4.6"
equation "\"RedLeadWd\" = 21.4"
equation "\"RedLeadDp\" = 23.9"
equation "\"RedLeadHt\" = 5.5"
equation "\"CyanLeadPedesWd\" = 29.6"
equation "\"CyanLeadPedesDp\" = 30"
equation "\"CyanLeadPedesGap\" = 4.52"
equation "\"CyanLeadPedesHt\" = 2.8"
equation "\"CyanLeadWd\" = 21.4"
equation "\"CyanLeadDp\" = 23.9"
equation "\"CyanLeadHt\" = 7.3"
equation "\"InCapHldWd\" = 1"
equation "\"InCapHldDp\" = 2.2"
equation "\"d84\" = 1"
equation "\"d85\" = 2.2"
equation "\"d35\" = 15.4"
equation "\"d37\" = 18.85"
equation "\"d38\" = 2.9"
properties part number "batteryCellTop" material "Aluminum 6061"
